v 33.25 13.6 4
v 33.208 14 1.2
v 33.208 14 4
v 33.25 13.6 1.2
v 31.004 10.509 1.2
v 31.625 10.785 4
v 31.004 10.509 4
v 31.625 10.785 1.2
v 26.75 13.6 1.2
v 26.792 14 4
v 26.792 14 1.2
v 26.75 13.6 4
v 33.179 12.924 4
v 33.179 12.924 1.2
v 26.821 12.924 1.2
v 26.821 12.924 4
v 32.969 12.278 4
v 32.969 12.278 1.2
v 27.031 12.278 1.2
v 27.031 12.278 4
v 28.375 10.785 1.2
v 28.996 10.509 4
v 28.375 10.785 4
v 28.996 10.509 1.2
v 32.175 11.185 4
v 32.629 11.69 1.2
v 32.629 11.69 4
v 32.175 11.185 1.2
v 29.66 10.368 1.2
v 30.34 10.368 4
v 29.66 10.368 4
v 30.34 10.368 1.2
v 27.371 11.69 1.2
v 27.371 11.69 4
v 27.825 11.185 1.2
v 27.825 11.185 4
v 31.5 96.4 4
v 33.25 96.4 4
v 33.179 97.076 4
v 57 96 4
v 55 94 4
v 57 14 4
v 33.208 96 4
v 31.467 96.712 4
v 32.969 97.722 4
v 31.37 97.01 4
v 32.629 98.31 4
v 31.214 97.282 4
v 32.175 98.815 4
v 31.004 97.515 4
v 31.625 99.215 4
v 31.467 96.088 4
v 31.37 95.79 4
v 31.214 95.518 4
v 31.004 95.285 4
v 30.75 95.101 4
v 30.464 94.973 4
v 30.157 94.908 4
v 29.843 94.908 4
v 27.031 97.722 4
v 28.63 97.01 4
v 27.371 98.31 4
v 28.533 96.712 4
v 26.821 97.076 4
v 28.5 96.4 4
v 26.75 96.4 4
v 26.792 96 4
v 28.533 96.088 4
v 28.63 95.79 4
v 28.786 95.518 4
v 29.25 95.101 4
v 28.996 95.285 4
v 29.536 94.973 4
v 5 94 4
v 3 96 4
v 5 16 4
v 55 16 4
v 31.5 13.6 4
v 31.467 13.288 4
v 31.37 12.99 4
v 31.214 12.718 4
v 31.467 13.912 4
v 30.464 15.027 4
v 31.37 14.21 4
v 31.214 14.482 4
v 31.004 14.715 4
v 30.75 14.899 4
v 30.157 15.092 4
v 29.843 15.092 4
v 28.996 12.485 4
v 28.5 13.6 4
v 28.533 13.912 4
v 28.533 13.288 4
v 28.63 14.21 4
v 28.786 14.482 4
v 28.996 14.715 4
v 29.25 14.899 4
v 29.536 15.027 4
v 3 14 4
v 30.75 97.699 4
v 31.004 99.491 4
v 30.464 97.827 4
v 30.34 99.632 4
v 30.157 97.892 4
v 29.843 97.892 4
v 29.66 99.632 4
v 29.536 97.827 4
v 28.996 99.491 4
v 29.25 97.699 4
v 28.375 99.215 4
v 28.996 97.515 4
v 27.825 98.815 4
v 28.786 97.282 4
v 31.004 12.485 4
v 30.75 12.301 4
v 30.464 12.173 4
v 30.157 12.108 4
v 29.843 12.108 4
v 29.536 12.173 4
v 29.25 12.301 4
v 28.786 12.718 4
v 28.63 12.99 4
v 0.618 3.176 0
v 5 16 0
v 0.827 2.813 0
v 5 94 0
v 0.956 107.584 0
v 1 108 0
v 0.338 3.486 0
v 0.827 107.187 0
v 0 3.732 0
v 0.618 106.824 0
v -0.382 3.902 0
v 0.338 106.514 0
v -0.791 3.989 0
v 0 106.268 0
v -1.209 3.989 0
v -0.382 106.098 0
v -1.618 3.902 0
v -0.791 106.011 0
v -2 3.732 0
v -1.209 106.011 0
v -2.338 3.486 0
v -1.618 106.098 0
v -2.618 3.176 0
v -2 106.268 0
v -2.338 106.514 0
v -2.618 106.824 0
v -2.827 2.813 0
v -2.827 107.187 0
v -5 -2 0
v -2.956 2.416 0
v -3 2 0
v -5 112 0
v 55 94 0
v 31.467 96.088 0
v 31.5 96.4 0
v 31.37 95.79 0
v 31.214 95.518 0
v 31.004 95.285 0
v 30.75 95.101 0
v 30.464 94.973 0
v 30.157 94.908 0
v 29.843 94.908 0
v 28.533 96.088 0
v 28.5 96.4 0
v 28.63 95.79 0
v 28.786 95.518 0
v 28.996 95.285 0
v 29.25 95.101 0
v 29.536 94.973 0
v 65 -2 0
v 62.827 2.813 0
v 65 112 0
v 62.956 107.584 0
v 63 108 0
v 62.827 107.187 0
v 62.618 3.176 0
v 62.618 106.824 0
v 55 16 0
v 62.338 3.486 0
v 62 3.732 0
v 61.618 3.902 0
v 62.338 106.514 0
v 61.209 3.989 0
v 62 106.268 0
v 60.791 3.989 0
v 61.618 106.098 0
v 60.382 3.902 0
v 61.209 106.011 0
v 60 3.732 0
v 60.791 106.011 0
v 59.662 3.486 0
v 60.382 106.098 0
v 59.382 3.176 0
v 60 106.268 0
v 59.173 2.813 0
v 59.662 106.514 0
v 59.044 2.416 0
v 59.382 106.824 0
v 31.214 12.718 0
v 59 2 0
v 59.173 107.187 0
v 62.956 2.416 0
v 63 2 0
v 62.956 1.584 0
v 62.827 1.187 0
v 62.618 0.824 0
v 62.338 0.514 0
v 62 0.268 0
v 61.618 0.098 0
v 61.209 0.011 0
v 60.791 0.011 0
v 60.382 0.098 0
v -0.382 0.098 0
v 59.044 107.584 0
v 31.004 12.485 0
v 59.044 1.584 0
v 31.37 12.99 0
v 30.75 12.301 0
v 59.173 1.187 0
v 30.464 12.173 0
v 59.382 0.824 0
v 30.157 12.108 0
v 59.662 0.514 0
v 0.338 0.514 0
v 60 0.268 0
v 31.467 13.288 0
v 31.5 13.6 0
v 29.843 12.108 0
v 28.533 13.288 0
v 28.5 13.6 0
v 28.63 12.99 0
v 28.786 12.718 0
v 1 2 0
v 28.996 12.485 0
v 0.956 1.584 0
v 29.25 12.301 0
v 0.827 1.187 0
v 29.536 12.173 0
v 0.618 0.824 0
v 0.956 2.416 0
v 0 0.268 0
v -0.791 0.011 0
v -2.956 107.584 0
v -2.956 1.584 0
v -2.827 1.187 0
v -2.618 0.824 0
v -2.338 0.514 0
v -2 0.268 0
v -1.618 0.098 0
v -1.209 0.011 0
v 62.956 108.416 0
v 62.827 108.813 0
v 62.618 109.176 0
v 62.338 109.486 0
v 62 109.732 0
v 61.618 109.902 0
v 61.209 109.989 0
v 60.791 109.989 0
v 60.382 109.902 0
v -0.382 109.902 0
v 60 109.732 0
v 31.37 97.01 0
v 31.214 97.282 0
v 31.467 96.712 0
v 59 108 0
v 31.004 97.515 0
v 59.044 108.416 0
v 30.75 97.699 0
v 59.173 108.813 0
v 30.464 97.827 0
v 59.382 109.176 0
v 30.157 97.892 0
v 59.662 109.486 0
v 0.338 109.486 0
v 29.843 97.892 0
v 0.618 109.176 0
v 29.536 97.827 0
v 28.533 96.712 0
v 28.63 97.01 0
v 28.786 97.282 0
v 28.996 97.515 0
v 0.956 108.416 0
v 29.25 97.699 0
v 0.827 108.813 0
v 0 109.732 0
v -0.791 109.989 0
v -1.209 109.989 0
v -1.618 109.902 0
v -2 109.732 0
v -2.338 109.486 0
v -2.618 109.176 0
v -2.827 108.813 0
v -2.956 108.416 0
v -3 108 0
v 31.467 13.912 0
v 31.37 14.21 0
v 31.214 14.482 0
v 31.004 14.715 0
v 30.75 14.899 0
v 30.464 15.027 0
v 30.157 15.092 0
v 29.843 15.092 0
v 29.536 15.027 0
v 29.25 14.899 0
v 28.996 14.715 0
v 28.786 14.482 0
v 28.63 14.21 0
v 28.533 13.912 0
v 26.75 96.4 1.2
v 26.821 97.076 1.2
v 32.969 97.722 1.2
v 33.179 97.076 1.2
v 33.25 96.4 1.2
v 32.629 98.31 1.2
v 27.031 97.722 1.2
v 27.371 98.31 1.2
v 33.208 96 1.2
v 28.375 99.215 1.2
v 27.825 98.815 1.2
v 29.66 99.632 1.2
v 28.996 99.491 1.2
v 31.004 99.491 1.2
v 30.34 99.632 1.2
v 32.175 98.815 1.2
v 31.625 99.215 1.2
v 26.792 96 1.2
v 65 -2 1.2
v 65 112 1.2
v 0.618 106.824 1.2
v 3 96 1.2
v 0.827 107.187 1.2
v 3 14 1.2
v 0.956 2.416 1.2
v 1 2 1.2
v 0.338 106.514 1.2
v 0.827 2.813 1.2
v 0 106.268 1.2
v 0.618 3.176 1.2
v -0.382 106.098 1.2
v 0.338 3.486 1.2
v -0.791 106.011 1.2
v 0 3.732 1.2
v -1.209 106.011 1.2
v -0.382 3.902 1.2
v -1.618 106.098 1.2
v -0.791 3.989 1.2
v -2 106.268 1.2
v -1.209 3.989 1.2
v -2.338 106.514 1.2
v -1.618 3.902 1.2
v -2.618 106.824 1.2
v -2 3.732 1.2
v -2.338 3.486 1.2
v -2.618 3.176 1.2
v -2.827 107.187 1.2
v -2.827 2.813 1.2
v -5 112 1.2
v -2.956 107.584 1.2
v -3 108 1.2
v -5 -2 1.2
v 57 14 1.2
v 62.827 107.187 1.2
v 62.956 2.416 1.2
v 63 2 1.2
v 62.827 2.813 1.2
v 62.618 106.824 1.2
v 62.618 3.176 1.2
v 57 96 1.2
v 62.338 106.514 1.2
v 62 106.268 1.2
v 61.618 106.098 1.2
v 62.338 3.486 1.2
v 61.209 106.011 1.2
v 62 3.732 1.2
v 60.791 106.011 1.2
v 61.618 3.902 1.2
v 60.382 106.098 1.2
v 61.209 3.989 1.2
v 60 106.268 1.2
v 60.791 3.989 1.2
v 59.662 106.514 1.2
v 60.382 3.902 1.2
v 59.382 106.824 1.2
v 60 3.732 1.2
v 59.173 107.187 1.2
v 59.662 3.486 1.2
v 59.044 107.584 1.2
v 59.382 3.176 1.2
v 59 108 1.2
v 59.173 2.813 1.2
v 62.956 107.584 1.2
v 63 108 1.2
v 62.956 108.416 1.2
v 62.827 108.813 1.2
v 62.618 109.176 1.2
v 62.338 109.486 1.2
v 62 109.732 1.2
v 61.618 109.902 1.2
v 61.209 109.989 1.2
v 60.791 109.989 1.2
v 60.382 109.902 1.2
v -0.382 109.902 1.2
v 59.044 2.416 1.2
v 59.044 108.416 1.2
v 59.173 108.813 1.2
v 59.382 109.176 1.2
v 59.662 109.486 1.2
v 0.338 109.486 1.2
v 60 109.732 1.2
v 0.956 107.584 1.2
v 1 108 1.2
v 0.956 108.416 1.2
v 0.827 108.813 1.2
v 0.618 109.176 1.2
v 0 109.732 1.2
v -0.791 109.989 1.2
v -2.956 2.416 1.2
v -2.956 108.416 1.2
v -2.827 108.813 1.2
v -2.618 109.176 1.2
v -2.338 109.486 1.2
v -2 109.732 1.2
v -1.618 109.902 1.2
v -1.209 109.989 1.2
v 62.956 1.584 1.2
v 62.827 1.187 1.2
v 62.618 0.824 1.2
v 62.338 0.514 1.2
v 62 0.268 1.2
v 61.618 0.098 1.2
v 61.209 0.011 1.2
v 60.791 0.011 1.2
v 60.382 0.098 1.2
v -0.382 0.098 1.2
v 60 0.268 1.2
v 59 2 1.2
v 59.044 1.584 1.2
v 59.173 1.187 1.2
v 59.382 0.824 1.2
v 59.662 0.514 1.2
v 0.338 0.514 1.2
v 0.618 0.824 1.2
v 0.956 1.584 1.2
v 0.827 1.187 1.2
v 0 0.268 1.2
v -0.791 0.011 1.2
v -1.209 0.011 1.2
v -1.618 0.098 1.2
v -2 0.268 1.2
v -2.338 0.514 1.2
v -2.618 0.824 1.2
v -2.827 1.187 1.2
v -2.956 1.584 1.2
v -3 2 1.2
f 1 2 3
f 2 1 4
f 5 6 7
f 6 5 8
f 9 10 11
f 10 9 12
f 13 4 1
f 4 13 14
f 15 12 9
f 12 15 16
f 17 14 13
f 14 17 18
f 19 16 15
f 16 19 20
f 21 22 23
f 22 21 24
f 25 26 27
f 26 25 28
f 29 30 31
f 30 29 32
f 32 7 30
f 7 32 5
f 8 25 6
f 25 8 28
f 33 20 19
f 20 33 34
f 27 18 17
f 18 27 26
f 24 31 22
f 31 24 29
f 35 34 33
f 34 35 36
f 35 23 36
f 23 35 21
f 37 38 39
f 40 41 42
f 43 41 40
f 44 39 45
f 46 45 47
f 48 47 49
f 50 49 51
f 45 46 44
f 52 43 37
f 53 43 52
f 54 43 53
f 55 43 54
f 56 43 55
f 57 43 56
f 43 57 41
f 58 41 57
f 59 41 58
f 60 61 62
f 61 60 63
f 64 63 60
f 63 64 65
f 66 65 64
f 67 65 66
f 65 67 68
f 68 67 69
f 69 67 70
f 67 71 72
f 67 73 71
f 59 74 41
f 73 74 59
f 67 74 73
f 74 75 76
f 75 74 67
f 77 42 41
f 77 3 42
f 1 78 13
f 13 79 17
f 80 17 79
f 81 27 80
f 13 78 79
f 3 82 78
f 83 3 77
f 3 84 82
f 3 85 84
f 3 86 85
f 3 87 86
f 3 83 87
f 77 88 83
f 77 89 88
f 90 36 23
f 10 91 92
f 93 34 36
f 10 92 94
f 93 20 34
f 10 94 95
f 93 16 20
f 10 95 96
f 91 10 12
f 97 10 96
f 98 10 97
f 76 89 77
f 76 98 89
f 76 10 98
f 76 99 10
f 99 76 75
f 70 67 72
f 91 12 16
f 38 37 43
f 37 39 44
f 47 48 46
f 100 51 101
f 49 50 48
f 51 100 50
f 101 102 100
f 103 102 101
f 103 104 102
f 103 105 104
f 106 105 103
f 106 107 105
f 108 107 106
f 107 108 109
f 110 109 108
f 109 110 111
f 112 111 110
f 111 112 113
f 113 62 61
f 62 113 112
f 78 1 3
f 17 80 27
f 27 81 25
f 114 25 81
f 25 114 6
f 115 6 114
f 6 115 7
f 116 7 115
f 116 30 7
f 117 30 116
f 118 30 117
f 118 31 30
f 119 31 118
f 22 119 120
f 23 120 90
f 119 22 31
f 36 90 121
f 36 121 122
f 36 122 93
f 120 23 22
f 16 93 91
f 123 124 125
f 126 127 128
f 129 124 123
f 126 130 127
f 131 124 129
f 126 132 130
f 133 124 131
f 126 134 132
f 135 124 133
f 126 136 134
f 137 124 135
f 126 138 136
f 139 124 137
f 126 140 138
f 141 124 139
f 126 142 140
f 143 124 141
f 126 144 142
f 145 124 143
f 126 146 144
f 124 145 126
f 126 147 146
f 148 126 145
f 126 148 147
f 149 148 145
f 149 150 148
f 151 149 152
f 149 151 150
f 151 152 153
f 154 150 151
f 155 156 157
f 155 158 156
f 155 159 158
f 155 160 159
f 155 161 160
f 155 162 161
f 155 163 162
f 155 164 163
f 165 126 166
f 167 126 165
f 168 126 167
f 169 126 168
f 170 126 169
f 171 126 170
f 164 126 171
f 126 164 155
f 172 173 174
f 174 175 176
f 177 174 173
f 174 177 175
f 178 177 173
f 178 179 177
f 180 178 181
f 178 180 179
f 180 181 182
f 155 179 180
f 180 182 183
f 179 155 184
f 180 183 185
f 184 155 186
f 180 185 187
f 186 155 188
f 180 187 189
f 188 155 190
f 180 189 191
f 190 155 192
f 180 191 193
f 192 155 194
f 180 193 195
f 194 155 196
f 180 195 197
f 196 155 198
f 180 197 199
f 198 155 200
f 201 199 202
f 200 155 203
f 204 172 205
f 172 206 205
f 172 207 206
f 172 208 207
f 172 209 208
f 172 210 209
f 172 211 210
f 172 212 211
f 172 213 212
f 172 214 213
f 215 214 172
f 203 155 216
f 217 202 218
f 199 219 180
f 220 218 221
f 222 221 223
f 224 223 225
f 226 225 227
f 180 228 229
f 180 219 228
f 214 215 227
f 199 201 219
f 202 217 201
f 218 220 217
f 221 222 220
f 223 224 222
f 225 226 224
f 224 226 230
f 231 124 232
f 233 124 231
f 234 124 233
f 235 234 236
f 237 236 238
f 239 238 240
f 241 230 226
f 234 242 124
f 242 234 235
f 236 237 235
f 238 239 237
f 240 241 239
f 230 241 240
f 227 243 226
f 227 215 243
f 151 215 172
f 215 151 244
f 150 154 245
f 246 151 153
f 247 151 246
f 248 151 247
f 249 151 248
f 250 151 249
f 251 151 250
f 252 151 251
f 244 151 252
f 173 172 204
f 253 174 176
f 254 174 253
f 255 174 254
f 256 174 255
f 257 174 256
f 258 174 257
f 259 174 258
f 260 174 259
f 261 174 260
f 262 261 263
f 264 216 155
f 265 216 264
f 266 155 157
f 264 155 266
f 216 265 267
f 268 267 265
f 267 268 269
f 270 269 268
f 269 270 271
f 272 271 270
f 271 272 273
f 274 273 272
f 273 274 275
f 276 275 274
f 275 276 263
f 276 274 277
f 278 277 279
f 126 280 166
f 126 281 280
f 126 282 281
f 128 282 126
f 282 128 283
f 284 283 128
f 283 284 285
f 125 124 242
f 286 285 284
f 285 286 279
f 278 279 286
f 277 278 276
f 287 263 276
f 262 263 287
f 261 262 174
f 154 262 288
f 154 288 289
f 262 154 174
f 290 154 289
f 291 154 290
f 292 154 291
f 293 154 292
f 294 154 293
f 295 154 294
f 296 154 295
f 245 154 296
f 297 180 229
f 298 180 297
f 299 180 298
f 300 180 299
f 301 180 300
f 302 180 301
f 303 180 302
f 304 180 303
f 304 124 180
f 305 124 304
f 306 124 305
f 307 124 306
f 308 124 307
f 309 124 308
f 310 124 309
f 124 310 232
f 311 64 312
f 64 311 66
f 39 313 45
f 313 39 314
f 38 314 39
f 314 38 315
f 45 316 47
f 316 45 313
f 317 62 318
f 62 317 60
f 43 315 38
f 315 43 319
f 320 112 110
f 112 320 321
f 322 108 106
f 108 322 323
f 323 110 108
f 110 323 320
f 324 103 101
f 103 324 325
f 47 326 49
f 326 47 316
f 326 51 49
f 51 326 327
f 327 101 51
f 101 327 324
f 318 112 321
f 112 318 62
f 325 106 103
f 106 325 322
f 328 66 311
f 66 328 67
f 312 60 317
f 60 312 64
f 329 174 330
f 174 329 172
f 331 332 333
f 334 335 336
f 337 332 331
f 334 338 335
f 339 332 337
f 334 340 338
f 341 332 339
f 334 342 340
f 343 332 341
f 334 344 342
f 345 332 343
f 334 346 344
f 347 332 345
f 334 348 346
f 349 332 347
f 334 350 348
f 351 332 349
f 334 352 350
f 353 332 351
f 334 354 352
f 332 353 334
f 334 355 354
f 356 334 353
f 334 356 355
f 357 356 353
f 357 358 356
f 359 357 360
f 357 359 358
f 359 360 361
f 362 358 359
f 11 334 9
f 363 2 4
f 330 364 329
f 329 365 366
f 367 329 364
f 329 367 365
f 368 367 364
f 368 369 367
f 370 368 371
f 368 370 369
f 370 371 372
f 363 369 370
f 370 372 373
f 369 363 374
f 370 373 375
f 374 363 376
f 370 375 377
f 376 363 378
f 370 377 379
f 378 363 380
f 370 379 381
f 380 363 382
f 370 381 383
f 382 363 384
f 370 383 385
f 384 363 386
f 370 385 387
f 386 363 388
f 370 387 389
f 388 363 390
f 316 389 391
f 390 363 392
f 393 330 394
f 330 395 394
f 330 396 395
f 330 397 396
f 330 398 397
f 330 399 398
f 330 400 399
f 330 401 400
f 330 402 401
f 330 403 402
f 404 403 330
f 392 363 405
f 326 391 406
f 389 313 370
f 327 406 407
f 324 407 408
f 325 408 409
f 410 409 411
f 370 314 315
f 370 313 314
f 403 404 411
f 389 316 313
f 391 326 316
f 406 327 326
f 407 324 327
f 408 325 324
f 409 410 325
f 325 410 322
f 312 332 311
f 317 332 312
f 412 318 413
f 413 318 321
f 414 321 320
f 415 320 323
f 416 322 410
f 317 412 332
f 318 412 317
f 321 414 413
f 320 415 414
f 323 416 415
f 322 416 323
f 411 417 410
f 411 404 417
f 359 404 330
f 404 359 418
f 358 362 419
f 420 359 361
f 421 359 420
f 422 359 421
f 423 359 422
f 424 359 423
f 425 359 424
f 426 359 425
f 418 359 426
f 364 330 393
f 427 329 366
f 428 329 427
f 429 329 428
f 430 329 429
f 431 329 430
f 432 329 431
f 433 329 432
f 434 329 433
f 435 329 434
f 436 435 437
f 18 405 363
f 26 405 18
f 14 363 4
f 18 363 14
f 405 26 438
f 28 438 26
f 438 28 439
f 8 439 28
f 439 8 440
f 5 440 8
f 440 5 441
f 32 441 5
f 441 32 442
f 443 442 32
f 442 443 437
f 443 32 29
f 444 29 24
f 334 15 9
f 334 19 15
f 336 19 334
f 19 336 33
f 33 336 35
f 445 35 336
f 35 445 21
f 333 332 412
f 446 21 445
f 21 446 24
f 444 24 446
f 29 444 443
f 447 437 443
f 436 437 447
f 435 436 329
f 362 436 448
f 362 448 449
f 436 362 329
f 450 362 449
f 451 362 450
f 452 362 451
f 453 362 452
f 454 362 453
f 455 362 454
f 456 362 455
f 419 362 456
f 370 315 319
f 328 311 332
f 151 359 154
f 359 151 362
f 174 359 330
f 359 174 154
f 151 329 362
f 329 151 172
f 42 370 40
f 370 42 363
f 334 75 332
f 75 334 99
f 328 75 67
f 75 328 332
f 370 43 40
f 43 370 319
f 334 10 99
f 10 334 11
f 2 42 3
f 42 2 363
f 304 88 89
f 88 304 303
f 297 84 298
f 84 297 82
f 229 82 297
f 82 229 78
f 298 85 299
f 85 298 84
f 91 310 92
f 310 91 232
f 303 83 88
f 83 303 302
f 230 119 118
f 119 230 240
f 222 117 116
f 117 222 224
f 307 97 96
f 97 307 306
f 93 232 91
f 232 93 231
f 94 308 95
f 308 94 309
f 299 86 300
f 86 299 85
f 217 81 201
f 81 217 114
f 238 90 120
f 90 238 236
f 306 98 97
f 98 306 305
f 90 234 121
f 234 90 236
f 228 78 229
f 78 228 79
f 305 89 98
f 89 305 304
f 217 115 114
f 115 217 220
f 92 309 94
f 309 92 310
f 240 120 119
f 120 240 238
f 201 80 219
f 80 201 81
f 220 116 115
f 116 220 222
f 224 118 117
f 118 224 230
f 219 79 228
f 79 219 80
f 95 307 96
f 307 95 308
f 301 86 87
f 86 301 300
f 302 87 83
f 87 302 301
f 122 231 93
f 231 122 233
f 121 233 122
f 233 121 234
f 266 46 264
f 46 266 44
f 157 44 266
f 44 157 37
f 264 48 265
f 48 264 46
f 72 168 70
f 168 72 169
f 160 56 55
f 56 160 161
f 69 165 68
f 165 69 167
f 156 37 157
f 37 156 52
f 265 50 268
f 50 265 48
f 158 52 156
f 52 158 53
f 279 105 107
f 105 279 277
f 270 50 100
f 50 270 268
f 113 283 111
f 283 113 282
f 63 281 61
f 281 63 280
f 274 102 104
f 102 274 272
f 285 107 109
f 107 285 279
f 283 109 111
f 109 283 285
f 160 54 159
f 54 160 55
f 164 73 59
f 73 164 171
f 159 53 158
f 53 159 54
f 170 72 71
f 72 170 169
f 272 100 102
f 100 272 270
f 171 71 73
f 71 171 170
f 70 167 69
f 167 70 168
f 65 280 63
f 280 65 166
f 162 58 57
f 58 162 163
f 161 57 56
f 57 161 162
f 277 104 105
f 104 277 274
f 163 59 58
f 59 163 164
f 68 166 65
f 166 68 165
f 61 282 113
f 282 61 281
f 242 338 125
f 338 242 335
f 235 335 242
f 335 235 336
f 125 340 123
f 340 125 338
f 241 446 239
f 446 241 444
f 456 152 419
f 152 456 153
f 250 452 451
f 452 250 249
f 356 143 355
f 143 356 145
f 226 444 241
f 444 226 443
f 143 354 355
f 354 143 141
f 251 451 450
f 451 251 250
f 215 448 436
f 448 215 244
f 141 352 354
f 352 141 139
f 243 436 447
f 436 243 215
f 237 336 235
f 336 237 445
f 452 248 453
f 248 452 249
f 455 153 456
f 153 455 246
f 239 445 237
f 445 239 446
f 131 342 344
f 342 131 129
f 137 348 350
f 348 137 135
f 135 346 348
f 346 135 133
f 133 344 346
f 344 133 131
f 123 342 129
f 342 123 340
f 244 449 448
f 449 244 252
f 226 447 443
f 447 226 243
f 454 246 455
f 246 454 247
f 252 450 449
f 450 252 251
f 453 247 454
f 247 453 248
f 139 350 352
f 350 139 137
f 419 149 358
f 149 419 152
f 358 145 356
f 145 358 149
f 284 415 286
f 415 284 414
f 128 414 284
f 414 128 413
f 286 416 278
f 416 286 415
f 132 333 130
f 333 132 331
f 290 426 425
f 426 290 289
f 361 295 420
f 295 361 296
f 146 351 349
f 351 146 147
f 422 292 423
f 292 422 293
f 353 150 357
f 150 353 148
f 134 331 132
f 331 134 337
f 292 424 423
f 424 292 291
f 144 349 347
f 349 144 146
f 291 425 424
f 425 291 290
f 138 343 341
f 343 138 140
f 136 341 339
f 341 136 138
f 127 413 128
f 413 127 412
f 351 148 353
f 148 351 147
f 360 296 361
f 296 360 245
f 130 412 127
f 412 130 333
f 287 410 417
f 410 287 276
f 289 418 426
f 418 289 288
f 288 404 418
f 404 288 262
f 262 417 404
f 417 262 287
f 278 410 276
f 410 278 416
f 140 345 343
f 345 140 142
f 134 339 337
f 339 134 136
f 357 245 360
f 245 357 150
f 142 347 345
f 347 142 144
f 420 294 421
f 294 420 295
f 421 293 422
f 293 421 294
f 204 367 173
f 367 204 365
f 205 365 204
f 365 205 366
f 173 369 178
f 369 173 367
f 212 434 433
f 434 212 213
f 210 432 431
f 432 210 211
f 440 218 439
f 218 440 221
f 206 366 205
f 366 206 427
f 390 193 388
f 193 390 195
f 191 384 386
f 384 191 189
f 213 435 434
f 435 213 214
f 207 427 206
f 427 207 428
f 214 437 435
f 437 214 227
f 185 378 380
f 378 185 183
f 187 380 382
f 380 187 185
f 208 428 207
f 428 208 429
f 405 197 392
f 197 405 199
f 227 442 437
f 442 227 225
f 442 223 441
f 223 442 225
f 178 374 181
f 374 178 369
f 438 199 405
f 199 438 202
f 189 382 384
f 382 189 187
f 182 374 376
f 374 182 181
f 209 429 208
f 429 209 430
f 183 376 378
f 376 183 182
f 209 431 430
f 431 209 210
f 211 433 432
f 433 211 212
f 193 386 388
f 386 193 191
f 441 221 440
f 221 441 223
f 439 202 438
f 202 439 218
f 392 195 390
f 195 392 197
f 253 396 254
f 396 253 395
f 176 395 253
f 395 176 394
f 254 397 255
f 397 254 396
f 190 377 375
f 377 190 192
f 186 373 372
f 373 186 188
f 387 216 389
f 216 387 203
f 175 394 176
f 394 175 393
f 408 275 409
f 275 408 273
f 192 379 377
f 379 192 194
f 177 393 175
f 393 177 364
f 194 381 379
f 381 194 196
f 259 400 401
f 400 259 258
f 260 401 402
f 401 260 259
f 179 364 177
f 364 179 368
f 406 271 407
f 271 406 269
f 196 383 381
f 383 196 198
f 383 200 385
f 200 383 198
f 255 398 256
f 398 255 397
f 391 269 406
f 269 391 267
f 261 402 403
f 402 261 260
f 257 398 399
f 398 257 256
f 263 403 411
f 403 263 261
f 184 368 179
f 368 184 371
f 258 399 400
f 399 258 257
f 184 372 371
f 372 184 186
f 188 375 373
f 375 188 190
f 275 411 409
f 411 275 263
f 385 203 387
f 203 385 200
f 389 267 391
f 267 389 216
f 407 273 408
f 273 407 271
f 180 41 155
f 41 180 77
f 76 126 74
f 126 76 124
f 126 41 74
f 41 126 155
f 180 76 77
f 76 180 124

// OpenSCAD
difference() {
  union() {
    translate([-5,-2]) cube([70,114,1.2]);
    translate([3,14]) cube([54,82,4]);
    for(y=[13.6,110-13.6])
      translate([30,y]) cylinder(d=6.5,h=4,$fn=30);

  }
  translate([5,16,-.01])
    cube([50,78,5]);
  for(y=[13.6,110-13.6])
    translate([30,y,-.01]) cylinder(d=3,h=5,$fn=30);
  for(x=[-1,61],y=[2,108])
    translate([x,y,-.01]) cylinder(d=4,h=5,$fn=30);
}
